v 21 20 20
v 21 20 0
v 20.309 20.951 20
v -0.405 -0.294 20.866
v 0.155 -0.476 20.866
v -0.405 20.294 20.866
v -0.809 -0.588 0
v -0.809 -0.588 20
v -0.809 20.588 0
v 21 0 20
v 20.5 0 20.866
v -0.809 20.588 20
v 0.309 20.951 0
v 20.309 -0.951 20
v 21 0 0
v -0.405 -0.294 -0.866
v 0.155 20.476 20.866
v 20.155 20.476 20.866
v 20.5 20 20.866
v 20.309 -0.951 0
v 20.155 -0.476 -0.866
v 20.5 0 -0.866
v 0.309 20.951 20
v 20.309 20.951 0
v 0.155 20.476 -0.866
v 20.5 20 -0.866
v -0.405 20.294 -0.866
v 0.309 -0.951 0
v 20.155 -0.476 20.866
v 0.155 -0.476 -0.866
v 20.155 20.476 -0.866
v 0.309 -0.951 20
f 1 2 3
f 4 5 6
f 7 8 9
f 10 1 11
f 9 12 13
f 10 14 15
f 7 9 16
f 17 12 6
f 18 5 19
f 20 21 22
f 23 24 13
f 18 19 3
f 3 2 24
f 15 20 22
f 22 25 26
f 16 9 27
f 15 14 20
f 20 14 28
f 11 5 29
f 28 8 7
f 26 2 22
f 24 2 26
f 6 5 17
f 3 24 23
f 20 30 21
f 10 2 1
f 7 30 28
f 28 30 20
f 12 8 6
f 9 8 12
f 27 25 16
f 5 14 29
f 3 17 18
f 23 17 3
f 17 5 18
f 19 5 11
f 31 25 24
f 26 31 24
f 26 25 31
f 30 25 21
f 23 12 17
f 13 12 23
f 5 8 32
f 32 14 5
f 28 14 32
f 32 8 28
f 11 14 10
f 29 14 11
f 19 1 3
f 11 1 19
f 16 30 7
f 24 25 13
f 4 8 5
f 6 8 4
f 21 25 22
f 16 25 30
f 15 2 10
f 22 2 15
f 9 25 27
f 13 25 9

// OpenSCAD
module RCube(size)
{
	minkowski()
	{
		cube(size, center=true);
		translate([size/2,size/2,size/2])sphere(1);
	}
}

RCube(20);
